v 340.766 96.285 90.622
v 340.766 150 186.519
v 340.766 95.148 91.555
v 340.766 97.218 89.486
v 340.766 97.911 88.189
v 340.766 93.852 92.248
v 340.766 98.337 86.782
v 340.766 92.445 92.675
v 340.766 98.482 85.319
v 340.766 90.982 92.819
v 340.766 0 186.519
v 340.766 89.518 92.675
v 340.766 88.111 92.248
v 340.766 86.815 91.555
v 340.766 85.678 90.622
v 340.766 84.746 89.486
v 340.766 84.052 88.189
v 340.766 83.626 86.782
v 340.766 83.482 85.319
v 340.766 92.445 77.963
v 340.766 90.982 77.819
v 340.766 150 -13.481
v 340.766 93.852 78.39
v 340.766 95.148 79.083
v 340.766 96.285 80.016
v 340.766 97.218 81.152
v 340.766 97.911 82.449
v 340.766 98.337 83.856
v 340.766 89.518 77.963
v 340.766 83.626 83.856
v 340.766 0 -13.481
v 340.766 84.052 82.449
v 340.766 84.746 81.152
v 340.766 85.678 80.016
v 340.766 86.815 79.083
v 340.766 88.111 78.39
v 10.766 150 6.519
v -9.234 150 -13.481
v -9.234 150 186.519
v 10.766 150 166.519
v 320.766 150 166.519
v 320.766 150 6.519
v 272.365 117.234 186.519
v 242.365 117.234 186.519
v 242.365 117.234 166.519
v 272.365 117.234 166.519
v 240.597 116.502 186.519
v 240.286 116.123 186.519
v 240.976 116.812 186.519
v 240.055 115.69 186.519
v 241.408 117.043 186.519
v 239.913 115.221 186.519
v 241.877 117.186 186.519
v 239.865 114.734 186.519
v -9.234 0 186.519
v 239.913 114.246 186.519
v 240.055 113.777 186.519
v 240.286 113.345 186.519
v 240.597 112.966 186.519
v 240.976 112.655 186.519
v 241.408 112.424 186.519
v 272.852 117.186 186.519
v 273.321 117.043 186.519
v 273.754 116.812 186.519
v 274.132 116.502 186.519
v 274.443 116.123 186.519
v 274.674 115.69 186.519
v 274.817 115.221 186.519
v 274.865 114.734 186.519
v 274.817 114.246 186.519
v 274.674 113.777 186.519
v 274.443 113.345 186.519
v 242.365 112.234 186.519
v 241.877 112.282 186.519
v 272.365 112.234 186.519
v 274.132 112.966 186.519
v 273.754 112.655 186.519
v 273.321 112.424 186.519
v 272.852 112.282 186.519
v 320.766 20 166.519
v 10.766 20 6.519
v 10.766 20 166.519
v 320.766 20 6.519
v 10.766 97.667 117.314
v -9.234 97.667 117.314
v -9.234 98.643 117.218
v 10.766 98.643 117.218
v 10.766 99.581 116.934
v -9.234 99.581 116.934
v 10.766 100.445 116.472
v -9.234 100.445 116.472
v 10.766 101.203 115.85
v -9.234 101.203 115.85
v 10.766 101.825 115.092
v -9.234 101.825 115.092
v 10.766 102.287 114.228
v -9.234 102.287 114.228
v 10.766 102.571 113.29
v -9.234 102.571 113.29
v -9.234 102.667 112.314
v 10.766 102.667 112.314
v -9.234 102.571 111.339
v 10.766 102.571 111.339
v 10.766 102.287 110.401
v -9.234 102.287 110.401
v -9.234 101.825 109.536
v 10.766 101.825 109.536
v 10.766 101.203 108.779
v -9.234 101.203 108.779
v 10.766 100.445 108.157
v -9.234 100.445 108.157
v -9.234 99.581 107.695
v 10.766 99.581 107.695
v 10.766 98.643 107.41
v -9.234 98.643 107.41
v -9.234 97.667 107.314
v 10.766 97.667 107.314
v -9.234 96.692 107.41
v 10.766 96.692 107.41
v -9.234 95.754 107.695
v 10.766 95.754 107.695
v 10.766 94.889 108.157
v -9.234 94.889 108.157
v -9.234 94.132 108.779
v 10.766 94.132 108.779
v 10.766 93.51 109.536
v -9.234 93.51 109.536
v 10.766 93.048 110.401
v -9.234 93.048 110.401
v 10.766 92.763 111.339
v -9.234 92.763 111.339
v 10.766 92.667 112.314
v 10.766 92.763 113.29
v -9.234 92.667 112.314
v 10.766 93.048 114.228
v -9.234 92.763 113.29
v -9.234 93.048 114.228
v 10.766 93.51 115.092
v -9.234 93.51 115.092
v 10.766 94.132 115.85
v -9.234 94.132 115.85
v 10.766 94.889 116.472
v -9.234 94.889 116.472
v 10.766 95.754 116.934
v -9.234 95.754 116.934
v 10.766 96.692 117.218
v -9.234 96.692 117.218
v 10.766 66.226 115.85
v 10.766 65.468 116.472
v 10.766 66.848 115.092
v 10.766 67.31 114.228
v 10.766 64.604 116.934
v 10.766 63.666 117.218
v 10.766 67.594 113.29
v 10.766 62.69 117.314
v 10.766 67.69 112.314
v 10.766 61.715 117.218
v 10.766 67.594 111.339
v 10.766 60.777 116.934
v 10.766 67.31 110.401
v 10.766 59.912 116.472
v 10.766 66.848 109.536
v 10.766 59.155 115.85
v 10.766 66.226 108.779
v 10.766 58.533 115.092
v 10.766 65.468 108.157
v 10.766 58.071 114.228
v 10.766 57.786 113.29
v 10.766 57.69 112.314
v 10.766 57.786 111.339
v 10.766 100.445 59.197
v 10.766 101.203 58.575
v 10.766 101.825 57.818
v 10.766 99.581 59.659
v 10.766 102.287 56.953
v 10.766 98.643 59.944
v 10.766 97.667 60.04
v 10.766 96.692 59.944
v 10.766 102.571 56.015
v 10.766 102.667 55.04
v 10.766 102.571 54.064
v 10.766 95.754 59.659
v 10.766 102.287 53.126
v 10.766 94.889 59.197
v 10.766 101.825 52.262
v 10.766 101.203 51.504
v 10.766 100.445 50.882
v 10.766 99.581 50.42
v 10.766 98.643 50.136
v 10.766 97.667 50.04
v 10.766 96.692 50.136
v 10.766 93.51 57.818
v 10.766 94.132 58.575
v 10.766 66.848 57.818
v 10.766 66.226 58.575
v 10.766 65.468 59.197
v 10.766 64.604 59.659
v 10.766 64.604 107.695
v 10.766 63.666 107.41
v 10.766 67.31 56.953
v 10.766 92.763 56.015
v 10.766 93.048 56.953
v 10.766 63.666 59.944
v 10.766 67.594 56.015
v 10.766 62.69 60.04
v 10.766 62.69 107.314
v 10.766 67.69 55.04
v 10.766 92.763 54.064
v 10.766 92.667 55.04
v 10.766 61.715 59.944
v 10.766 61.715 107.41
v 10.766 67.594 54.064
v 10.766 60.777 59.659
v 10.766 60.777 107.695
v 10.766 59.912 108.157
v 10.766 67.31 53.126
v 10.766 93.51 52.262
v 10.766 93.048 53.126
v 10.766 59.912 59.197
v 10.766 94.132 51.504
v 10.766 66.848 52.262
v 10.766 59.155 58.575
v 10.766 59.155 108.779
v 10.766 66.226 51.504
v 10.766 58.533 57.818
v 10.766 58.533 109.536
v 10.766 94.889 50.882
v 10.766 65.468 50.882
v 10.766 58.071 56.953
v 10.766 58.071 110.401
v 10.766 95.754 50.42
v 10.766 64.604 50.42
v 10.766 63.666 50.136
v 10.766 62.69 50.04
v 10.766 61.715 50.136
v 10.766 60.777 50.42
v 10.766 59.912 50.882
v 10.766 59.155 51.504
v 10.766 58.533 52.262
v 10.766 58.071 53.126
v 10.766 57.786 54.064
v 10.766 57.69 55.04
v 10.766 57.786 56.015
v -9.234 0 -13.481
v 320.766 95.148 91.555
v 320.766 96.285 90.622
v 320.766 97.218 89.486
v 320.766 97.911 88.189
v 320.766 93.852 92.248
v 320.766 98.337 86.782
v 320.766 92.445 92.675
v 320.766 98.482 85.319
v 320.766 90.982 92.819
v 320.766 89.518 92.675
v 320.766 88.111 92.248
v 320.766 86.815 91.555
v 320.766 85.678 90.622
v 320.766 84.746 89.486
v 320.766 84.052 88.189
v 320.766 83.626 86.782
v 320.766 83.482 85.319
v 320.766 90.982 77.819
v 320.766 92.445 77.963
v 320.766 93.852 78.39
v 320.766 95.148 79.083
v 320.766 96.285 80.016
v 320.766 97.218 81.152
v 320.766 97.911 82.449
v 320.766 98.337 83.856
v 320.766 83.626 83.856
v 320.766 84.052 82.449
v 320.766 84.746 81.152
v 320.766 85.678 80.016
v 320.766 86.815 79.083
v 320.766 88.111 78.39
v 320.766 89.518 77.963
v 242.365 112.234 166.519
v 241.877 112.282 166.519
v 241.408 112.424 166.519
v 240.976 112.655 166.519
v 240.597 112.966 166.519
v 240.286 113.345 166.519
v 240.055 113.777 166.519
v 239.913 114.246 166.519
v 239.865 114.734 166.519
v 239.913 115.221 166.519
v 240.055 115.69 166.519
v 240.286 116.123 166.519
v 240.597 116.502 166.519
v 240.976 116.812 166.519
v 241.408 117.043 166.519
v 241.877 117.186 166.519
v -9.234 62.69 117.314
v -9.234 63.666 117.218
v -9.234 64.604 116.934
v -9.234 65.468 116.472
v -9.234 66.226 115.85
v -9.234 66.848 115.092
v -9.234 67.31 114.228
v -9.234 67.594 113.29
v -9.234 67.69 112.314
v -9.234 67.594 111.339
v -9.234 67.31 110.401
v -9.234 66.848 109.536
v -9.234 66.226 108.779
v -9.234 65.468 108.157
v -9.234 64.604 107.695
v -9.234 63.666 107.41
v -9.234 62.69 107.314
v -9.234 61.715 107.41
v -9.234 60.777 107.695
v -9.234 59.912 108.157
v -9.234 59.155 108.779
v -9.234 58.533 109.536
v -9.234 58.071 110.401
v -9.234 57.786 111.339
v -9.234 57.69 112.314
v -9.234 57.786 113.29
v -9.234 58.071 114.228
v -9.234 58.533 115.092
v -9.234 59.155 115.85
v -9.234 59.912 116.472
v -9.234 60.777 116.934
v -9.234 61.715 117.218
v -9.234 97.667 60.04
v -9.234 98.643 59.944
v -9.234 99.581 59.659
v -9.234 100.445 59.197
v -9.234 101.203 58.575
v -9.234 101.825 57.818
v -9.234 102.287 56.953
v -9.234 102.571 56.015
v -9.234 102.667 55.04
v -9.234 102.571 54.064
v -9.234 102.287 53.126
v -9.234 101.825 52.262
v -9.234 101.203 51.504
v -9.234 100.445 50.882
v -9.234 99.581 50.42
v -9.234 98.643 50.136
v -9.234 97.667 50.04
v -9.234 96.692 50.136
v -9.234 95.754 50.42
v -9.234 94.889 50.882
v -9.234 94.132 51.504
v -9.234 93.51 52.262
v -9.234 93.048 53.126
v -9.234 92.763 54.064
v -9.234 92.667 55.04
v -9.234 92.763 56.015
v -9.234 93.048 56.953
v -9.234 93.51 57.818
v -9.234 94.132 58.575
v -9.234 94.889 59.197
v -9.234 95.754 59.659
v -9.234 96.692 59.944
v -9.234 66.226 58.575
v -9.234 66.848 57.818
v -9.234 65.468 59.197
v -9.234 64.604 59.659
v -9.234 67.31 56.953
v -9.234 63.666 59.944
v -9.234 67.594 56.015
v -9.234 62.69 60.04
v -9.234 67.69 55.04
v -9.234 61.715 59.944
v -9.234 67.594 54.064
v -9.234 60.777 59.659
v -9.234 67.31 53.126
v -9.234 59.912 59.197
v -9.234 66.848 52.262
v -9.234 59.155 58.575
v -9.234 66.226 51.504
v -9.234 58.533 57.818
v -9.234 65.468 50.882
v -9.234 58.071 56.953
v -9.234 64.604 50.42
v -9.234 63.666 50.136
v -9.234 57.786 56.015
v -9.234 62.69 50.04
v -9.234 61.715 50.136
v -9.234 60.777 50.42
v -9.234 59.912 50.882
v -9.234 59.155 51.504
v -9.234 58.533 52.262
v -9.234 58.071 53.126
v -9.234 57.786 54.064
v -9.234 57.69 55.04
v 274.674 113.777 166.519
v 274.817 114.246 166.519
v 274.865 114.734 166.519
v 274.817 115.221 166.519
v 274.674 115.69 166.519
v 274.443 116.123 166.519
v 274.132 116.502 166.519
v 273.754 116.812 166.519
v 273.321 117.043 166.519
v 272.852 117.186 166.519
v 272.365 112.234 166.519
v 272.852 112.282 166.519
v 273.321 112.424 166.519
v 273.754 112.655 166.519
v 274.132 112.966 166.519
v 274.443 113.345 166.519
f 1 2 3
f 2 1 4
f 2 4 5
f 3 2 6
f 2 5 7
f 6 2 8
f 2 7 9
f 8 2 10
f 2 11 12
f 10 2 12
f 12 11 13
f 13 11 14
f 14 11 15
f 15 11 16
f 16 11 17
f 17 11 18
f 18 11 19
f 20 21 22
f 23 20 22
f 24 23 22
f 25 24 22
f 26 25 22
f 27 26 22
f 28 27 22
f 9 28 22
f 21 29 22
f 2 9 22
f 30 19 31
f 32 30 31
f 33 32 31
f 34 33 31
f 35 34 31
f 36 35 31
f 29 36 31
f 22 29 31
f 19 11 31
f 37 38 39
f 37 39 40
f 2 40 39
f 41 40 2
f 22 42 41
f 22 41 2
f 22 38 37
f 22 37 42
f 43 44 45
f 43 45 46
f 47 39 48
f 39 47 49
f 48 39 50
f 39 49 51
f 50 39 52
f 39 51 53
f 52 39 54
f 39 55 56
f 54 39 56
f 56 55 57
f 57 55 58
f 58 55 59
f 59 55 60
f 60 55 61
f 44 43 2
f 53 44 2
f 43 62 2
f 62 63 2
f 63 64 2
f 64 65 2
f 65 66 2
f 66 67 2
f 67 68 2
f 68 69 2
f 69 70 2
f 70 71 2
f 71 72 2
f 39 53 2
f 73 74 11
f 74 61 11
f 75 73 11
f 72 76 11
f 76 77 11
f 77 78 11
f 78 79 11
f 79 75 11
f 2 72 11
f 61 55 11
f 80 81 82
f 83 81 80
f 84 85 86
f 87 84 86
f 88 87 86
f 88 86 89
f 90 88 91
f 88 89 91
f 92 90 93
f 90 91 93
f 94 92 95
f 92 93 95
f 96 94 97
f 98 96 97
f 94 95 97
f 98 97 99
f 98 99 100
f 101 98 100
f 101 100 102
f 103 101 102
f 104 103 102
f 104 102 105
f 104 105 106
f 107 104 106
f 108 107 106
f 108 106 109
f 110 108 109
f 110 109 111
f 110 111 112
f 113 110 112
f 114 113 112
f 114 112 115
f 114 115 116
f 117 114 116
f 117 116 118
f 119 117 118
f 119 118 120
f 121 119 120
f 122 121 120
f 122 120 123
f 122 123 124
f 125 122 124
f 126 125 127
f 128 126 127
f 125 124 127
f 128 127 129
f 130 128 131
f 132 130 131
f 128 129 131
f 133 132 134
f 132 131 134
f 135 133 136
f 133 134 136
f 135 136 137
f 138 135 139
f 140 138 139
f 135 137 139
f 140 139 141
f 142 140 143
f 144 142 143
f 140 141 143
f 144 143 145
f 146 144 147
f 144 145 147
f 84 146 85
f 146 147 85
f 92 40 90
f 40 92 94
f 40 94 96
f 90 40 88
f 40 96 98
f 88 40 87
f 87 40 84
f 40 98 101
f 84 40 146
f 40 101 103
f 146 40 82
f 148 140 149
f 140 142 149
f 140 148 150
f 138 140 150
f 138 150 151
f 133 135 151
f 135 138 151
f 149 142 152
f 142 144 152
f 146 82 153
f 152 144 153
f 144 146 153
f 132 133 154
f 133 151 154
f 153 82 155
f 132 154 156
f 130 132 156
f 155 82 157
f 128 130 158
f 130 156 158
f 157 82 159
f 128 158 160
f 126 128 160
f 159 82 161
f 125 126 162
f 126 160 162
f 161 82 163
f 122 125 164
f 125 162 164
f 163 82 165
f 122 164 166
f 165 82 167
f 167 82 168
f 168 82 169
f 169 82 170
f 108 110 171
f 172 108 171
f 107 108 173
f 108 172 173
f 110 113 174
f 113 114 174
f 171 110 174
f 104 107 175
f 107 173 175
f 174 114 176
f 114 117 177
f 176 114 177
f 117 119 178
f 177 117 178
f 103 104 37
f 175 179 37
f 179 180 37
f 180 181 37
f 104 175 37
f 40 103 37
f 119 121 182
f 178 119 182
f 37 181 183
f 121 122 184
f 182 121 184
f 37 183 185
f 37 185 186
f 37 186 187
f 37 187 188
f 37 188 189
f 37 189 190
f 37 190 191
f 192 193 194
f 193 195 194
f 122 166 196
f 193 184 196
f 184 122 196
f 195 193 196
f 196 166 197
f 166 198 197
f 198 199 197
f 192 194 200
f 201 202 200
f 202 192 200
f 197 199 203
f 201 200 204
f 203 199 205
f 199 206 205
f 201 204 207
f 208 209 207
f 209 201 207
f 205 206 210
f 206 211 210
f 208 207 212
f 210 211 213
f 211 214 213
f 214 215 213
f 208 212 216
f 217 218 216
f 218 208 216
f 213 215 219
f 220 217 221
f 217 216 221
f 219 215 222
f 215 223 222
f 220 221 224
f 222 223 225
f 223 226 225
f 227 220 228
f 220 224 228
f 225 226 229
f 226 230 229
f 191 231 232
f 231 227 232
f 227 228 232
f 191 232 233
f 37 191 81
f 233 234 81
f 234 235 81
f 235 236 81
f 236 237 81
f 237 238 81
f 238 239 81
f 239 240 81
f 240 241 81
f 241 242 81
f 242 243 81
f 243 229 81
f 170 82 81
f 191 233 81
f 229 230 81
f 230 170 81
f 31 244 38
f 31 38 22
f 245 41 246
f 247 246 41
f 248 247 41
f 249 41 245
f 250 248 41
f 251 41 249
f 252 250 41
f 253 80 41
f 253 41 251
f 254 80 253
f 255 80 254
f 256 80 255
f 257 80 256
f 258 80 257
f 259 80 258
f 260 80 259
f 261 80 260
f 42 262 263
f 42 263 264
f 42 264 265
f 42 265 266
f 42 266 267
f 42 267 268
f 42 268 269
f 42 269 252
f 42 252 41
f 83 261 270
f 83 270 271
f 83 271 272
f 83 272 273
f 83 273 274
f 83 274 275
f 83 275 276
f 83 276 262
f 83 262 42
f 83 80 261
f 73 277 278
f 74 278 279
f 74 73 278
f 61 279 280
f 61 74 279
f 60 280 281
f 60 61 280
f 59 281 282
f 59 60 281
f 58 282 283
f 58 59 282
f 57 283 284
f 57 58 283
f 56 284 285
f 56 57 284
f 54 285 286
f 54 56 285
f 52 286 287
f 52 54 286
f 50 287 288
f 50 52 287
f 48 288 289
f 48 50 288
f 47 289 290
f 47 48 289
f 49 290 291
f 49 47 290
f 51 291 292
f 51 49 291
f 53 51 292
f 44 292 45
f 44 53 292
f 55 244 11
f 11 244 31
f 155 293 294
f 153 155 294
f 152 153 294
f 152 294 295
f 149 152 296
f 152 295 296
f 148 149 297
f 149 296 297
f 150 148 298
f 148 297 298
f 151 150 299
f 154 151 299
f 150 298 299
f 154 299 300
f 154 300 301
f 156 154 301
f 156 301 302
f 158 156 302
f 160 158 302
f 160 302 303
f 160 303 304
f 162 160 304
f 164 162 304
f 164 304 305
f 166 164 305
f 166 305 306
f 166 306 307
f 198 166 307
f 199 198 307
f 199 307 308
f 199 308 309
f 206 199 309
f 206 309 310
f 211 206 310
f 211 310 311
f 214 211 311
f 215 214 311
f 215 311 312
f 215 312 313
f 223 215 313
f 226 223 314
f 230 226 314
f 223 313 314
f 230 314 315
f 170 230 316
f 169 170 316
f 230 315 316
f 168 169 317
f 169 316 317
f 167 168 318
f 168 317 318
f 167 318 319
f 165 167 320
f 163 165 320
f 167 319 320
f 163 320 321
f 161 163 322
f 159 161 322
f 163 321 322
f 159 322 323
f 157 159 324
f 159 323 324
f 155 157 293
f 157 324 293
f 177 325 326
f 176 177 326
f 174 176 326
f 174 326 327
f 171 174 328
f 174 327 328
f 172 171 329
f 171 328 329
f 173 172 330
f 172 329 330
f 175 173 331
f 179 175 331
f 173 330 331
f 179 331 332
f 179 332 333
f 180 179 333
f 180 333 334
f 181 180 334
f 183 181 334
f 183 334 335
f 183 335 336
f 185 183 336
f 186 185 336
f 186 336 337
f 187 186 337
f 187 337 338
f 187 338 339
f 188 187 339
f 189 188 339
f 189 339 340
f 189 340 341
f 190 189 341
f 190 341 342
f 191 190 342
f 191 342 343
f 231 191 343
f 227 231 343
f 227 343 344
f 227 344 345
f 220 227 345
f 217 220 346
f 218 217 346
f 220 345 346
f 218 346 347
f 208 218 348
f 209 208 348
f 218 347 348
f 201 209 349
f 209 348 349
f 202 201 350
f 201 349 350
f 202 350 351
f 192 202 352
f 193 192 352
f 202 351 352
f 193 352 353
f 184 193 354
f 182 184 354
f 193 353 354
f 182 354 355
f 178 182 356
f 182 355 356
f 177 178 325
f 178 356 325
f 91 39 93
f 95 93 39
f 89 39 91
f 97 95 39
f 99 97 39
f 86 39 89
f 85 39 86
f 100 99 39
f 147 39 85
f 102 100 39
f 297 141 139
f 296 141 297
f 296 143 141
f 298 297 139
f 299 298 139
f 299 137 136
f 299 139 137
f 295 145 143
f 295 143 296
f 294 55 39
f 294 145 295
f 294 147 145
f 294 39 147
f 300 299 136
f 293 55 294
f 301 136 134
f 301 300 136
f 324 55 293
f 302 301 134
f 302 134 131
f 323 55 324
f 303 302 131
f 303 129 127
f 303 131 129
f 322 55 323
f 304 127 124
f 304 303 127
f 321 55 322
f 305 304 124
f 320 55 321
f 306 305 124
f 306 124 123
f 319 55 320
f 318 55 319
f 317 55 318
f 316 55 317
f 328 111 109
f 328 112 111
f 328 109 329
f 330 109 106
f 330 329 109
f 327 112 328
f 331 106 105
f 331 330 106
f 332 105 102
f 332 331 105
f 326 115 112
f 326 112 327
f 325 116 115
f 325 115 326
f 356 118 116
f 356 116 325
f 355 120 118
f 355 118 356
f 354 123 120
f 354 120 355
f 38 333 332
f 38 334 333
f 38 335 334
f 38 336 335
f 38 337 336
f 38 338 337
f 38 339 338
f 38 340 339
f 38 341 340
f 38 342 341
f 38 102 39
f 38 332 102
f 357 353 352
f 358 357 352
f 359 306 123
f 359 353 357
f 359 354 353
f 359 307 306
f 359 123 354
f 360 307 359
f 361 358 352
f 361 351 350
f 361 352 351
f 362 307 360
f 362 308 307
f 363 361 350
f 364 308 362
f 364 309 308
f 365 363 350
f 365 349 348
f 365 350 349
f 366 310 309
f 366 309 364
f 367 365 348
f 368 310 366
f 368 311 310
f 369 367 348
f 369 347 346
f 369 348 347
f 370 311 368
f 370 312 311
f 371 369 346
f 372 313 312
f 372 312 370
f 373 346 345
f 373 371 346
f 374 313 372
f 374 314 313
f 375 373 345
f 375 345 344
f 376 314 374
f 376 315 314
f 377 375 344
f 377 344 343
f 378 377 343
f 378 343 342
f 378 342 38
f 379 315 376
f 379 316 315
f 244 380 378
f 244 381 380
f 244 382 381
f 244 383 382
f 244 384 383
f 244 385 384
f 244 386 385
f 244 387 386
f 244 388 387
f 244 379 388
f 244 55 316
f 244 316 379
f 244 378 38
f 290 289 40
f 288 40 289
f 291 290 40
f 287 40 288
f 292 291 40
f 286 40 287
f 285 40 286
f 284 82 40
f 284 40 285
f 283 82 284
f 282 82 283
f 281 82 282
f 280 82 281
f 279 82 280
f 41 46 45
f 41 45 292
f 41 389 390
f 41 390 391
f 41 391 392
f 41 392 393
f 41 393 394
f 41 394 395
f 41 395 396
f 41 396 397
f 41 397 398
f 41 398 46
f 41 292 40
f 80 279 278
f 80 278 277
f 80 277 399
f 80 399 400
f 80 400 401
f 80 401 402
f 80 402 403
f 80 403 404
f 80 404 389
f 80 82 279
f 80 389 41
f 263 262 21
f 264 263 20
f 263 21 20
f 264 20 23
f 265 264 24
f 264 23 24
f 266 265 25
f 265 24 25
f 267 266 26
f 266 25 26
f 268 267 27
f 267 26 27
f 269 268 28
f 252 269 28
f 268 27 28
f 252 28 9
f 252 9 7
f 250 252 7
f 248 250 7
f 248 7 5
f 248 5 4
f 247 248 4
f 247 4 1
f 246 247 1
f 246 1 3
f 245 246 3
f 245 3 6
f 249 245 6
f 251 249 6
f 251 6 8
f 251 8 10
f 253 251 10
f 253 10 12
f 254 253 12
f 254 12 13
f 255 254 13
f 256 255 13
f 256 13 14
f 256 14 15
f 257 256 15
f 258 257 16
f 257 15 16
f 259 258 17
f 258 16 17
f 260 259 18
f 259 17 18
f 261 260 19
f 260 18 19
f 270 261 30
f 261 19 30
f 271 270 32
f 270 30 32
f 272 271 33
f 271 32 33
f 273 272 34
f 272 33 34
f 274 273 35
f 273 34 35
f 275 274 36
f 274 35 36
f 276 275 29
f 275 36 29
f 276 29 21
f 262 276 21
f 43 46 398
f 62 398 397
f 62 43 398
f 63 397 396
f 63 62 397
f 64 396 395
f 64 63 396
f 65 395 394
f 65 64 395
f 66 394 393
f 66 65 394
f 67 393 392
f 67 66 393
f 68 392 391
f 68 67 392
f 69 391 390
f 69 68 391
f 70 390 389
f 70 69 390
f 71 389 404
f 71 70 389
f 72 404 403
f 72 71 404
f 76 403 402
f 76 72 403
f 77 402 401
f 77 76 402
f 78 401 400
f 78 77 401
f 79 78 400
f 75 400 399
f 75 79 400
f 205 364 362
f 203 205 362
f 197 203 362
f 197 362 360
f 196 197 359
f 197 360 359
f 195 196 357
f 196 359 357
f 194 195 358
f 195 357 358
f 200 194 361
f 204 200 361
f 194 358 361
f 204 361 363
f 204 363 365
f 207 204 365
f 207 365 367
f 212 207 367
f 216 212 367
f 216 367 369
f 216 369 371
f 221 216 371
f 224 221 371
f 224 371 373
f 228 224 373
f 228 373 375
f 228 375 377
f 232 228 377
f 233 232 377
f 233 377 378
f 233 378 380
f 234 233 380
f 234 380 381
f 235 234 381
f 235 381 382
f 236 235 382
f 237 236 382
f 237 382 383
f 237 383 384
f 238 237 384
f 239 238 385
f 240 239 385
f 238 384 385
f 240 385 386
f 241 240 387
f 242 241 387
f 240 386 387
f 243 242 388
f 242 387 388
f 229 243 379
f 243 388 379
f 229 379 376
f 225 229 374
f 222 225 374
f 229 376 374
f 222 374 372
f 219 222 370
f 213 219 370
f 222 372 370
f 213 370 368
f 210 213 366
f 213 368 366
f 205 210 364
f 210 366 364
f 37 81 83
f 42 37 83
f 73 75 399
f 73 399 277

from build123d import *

# Parameters (mm, degrees)
SKETCH_2_W          = 350
SKETCH_2_H          = 200
EXTRUDE_1_DEPTH     = 150
SHELL_1_T           = -20
CUT_EXTRUDE_1_REACH = 426.016
SKETCH_3_R          = 5
CUT_EXTRUDE_2_REACH = 426.016
SKETCH_4_R          = 7.5
CUT_EXTRUDE_3_REACH = 424.637


with BuildPart() as part:
    # 草图2 → 凸台-拉伸1 (new body)
    with BuildSketch(Plane(origin=(0, 0, 0), x_dir=(1, 0, 0), z_dir=(0, 1, 0))):
        with Locations((165.766338514, -86.518854231)):
            Rectangle(SKETCH_2_W, SKETCH_2_H)
    extrude(amount=EXTRUDE_1_DEPTH)

    # 抽壳1
    shell_1_openings = [part.faces().sort_by_distance(p)[0] for p in [
        (165.766338514, 150, 86.518854231),
    ]]
    offset(amount=SHELL_1_T, openings=shell_1_openings, kind=Kind.INTERSECTION)

    # 草图3 → 切除-拉伸1 (cut, up to next)
    with BuildSketch(Plane.ZY.offset(9.233661486), mode=Mode.PRIVATE) as cut_extrude_1_sk1:
        with Locations((55.039711013, 97.66717145)):
            Circle(SKETCH_3_R)
    cut_extrude_1_tool1 = extrude(cut_extrude_1_sk1.sketch, amount=-CUT_EXTRUDE_1_REACH, mode=Mode.PRIVATE) & part.part
    # 草图3 → 切除-拉伸1 (cut, up to next)
    with BuildSketch(Plane.ZY.offset(9.233661486), mode=Mode.PRIVATE) as cut_extrude_1_sk2:
        with Locations((112.314263257, 97.66717145)):
            Circle(SKETCH_3_R)
    cut_extrude_1_tool2 = extrude(cut_extrude_1_sk2.sketch, amount=-CUT_EXTRUDE_1_REACH, mode=Mode.PRIVATE) & part.part
    # 草图3 → 切除-拉伸1 (cut, up to next)
    with BuildSketch(Plane.ZY.offset(9.233661486), mode=Mode.PRIVATE) as cut_extrude_1_sk3:
        with Locations((55.039711013, 62.690345652)):
            Circle(SKETCH_3_R)
    cut_extrude_1_tool3 = extrude(cut_extrude_1_sk3.sketch, amount=-CUT_EXTRUDE_1_REACH, mode=Mode.PRIVATE) & part.part
    # 草图3 → 切除-拉伸1 (cut, up to next)
    with BuildSketch(Plane.ZY.offset(9.233661486), mode=Mode.PRIVATE) as cut_extrude_1_sk4:
        with Locations((112.314263257, 62.690345652)):
            Circle(SKETCH_3_R)
    cut_extrude_1_tool4 = extrude(cut_extrude_1_sk4.sketch, amount=-CUT_EXTRUDE_1_REACH, mode=Mode.PRIVATE) & part.part
    add(cut_extrude_1_tool1.solids().sort_by_distance((-9.233661, 97.667171, 55.039711))[0], mode=Mode.SUBTRACT)
    add(cut_extrude_1_tool2.solids().sort_by_distance((-9.233661, 97.667171, 112.314263))[0], mode=Mode.SUBTRACT)
    add(cut_extrude_1_tool3.solids().sort_by_distance((-9.233661, 62.690346, 55.039711))[0], mode=Mode.SUBTRACT)
    add(cut_extrude_1_tool4.solids().sort_by_distance((-9.233661, 62.690346, 112.314263))[0], mode=Mode.SUBTRACT)

    # 草图4 → 切除-拉伸2 (cut, up to next)
    with BuildSketch(Plane(origin=(340.766338514, 0, 0), x_dir=(0, 0, -1), z_dir=(1, 0, 0)), mode=Mode.PRIVATE) as cut_extrude_2_sk1:
        with Locations((-85.318851387, 90.981577925)):
            Circle(SKETCH_4_R)
    cut_extrude_2_tool1 = extrude(cut_extrude_2_sk1.sketch, amount=-CUT_EXTRUDE_2_REACH, mode=Mode.PRIVATE) & part.part
    add(cut_extrude_2_tool1.solids().sort_by_distance((340.766339, 90.981578, 85.318851))[0], mode=Mode.SUBTRACT)

    # 草图5 → 切除-拉伸3 (cut, up to next)
    with BuildSketch(Plane.XY.offset(186.518854231), mode=Mode.PRIVATE) as cut_extrude_3_sk1:
        with BuildLine():
            Line((242.364675661, 117.233767731), (272.364675661, 117.233767731))
            ThreePointArc((272.364675661, 117.233767731), (274.864675661, 114.733767731), (272.364675661, 112.233767731))
            Line((272.364675661, 112.233767731), (242.364675661, 112.233767731))
            ThreePointArc((242.364675661, 112.233767731), (239.864675661, 114.733767731), (242.364675661, 117.233767731))
        make_face()
    cut_extrude_3_tool1 = extrude(cut_extrude_3_sk1.sketch, amount=-CUT_EXTRUDE_3_REACH, mode=Mode.PRIVATE) & part.part
    add(cut_extrude_3_tool1.solids().sort_by_distance((257.364676, 114.733768, 186.518854))[0], mode=Mode.SUBTRACT)


solid = part.part
